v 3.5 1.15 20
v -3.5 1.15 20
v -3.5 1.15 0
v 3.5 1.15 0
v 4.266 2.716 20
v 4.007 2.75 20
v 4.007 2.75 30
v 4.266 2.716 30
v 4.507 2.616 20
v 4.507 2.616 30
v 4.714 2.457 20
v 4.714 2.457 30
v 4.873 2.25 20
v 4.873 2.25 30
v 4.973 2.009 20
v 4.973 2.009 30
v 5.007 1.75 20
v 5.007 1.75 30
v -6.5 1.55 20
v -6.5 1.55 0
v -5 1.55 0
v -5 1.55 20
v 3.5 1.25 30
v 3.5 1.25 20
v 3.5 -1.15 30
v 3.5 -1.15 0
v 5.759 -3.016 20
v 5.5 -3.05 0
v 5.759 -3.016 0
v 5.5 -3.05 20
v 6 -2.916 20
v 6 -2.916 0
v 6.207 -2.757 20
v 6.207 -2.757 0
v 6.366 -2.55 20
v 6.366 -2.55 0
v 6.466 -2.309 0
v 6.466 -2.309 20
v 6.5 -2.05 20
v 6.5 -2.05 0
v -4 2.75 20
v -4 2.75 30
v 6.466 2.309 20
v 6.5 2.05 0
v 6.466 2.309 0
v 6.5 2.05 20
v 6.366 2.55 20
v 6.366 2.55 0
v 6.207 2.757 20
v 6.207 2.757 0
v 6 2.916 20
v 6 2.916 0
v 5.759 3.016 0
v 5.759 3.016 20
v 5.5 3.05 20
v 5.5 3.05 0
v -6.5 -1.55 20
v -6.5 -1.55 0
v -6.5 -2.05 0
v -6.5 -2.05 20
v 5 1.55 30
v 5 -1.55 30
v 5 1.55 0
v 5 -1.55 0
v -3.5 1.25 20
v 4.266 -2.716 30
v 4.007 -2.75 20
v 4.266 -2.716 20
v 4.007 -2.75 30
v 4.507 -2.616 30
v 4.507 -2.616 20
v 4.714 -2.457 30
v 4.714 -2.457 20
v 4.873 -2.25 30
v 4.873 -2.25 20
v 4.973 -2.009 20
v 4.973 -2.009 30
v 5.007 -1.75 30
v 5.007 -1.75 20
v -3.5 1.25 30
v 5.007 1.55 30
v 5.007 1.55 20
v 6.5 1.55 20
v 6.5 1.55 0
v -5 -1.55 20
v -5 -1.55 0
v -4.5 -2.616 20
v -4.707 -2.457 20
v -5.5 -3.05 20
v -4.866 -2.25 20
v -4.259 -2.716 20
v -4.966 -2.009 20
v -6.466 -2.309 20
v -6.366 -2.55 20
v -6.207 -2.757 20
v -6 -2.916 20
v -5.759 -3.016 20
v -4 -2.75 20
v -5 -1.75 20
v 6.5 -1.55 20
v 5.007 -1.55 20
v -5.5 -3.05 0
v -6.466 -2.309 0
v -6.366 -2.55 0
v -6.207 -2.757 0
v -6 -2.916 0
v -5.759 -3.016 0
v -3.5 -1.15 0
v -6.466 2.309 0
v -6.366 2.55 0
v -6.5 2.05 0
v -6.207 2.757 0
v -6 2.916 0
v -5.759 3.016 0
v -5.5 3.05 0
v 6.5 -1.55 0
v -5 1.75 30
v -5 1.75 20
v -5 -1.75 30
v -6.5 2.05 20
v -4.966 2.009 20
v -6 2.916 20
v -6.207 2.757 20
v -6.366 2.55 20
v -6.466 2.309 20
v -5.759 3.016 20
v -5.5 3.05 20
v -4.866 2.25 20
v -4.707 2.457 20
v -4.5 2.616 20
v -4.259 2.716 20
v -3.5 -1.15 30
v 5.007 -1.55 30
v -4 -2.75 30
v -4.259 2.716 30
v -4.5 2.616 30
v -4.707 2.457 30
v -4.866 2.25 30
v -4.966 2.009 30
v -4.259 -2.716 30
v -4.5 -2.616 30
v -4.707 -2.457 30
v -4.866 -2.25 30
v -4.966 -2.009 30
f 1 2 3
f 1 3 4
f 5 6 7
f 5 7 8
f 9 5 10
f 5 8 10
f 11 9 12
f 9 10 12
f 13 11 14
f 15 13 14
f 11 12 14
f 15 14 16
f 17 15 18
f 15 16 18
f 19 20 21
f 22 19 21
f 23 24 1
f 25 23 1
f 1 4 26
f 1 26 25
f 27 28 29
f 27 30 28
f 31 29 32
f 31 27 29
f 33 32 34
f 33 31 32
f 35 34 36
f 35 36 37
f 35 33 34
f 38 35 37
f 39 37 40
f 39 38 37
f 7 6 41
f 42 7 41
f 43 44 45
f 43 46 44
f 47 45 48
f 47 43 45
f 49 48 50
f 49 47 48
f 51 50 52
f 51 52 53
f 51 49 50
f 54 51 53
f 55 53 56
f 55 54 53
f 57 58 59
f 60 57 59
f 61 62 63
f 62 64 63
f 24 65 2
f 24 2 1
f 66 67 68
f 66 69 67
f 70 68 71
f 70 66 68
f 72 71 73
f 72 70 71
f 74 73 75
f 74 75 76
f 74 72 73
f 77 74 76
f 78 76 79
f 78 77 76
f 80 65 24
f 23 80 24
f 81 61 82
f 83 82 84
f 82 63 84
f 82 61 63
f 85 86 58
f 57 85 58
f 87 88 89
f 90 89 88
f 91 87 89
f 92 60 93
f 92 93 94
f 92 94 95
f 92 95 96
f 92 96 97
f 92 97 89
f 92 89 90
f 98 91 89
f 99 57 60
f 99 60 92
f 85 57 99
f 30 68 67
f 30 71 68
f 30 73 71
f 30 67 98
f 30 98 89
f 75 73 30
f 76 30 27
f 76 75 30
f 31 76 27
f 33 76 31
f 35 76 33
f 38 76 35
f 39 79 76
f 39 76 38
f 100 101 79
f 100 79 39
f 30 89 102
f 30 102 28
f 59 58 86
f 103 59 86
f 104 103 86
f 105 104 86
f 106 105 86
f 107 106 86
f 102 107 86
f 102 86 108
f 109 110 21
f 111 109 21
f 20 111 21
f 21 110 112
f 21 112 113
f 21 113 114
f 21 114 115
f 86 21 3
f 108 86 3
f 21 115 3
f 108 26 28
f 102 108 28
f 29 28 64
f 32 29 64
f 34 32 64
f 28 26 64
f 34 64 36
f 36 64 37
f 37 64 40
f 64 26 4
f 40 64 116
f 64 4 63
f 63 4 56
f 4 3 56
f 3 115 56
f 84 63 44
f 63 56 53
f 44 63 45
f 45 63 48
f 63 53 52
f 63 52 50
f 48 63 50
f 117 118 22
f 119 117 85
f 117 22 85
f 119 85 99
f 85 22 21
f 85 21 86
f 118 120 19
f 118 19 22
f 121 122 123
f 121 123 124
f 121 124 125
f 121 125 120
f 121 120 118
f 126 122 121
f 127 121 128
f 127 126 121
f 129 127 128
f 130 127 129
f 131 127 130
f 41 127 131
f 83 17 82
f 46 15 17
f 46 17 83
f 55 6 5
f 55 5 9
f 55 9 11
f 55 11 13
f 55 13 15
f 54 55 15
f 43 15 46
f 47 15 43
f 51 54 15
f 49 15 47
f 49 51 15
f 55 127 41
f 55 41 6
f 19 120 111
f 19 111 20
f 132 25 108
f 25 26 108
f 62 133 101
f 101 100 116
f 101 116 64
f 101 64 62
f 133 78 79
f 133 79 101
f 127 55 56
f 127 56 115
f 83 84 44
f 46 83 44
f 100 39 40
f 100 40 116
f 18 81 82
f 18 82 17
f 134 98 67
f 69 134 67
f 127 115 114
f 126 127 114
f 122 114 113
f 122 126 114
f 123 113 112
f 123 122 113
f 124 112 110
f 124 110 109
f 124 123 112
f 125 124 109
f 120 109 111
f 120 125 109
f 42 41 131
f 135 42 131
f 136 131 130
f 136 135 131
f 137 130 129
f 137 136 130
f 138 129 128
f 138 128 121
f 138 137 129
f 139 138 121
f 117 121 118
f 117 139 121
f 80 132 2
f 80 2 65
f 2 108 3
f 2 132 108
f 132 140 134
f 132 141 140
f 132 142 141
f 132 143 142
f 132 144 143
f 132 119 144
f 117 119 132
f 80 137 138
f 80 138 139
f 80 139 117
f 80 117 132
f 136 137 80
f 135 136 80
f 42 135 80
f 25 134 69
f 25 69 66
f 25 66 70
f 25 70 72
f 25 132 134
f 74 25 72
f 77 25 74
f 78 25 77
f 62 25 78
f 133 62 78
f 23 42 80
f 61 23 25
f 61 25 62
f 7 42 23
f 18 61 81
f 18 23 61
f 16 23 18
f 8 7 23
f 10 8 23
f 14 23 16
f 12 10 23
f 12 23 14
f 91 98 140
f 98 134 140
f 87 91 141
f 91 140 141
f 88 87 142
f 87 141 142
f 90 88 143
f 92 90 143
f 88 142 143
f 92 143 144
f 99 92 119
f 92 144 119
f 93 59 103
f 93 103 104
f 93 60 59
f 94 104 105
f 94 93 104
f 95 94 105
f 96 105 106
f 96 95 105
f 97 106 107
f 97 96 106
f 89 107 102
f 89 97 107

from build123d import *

# Parameters (mm, degrees)
F0_W     = 7
F0_H     = 2.3
F1_DEPTH = 20
F3_DEPTH = 10
F4_R     = 1
F5_R     = 1


with BuildPart() as f1:
    # F0 (on Top) → F1 (new body)
    with BuildSketch(Plane.XY):
        Polygon((6.5, 3.05), (-6.5, 3.05), (-6.5, 1.55), (-5, 1.55), (-5, -1.55), (-6.5, -1.55), (-6.5, -3.05), (6.5, -3.05), (6.5, -1.55), (5, -1.55), (5, 1.55), (6.5, 1.55), align=None)
        Rectangle(F0_W, F0_H, mode=Mode.SUBTRACT)
    extrude(amount=F1_DEPTH)

    # F2 (on face) → F3 (join)
    with BuildSketch(Plane.XY.offset(20)):
        Polygon((-5, -1.55), (-5, -2.75), (5.006821, -2.75), (5.006821, -1.55), (5, -1.55), (5, 1.55), (5.006821, 1.55), (5.006821, 2.75), (-5, 2.75), (-5, 1.55), align=None)
        Polygon((3.5, -1.15), (-3.5, -1.15), (-3.5, 1.15), (-3.5, 1.25), (3.5, 1.25), (3.5, 1.15), align=None, mode=Mode.SUBTRACT)
    extrude(amount=F3_DEPTH)

    # F4
    f4_edges = [f1.edges().sort_by_distance(p)[0] for p in [
        (-5, 2.75, 25),
        (-5, -2.75, 25),
        (5.006821, 2.75, 25),
        (5.006821, -2.75, 25),
    ]]
    fillet(f4_edges, radius=F4_R)

    # F5
    f5_edges = [f1.edges().sort_by_distance(p)[0] for p in [
        (-6.5, 3.05, 10),
        (-6.5, -3.05, 10),
        (6.5, 3.05, 10),
        (6.5, -3.05, 10),
    ]]
    fillet(f5_edges, radius=F5_R)


solid = f1.part
